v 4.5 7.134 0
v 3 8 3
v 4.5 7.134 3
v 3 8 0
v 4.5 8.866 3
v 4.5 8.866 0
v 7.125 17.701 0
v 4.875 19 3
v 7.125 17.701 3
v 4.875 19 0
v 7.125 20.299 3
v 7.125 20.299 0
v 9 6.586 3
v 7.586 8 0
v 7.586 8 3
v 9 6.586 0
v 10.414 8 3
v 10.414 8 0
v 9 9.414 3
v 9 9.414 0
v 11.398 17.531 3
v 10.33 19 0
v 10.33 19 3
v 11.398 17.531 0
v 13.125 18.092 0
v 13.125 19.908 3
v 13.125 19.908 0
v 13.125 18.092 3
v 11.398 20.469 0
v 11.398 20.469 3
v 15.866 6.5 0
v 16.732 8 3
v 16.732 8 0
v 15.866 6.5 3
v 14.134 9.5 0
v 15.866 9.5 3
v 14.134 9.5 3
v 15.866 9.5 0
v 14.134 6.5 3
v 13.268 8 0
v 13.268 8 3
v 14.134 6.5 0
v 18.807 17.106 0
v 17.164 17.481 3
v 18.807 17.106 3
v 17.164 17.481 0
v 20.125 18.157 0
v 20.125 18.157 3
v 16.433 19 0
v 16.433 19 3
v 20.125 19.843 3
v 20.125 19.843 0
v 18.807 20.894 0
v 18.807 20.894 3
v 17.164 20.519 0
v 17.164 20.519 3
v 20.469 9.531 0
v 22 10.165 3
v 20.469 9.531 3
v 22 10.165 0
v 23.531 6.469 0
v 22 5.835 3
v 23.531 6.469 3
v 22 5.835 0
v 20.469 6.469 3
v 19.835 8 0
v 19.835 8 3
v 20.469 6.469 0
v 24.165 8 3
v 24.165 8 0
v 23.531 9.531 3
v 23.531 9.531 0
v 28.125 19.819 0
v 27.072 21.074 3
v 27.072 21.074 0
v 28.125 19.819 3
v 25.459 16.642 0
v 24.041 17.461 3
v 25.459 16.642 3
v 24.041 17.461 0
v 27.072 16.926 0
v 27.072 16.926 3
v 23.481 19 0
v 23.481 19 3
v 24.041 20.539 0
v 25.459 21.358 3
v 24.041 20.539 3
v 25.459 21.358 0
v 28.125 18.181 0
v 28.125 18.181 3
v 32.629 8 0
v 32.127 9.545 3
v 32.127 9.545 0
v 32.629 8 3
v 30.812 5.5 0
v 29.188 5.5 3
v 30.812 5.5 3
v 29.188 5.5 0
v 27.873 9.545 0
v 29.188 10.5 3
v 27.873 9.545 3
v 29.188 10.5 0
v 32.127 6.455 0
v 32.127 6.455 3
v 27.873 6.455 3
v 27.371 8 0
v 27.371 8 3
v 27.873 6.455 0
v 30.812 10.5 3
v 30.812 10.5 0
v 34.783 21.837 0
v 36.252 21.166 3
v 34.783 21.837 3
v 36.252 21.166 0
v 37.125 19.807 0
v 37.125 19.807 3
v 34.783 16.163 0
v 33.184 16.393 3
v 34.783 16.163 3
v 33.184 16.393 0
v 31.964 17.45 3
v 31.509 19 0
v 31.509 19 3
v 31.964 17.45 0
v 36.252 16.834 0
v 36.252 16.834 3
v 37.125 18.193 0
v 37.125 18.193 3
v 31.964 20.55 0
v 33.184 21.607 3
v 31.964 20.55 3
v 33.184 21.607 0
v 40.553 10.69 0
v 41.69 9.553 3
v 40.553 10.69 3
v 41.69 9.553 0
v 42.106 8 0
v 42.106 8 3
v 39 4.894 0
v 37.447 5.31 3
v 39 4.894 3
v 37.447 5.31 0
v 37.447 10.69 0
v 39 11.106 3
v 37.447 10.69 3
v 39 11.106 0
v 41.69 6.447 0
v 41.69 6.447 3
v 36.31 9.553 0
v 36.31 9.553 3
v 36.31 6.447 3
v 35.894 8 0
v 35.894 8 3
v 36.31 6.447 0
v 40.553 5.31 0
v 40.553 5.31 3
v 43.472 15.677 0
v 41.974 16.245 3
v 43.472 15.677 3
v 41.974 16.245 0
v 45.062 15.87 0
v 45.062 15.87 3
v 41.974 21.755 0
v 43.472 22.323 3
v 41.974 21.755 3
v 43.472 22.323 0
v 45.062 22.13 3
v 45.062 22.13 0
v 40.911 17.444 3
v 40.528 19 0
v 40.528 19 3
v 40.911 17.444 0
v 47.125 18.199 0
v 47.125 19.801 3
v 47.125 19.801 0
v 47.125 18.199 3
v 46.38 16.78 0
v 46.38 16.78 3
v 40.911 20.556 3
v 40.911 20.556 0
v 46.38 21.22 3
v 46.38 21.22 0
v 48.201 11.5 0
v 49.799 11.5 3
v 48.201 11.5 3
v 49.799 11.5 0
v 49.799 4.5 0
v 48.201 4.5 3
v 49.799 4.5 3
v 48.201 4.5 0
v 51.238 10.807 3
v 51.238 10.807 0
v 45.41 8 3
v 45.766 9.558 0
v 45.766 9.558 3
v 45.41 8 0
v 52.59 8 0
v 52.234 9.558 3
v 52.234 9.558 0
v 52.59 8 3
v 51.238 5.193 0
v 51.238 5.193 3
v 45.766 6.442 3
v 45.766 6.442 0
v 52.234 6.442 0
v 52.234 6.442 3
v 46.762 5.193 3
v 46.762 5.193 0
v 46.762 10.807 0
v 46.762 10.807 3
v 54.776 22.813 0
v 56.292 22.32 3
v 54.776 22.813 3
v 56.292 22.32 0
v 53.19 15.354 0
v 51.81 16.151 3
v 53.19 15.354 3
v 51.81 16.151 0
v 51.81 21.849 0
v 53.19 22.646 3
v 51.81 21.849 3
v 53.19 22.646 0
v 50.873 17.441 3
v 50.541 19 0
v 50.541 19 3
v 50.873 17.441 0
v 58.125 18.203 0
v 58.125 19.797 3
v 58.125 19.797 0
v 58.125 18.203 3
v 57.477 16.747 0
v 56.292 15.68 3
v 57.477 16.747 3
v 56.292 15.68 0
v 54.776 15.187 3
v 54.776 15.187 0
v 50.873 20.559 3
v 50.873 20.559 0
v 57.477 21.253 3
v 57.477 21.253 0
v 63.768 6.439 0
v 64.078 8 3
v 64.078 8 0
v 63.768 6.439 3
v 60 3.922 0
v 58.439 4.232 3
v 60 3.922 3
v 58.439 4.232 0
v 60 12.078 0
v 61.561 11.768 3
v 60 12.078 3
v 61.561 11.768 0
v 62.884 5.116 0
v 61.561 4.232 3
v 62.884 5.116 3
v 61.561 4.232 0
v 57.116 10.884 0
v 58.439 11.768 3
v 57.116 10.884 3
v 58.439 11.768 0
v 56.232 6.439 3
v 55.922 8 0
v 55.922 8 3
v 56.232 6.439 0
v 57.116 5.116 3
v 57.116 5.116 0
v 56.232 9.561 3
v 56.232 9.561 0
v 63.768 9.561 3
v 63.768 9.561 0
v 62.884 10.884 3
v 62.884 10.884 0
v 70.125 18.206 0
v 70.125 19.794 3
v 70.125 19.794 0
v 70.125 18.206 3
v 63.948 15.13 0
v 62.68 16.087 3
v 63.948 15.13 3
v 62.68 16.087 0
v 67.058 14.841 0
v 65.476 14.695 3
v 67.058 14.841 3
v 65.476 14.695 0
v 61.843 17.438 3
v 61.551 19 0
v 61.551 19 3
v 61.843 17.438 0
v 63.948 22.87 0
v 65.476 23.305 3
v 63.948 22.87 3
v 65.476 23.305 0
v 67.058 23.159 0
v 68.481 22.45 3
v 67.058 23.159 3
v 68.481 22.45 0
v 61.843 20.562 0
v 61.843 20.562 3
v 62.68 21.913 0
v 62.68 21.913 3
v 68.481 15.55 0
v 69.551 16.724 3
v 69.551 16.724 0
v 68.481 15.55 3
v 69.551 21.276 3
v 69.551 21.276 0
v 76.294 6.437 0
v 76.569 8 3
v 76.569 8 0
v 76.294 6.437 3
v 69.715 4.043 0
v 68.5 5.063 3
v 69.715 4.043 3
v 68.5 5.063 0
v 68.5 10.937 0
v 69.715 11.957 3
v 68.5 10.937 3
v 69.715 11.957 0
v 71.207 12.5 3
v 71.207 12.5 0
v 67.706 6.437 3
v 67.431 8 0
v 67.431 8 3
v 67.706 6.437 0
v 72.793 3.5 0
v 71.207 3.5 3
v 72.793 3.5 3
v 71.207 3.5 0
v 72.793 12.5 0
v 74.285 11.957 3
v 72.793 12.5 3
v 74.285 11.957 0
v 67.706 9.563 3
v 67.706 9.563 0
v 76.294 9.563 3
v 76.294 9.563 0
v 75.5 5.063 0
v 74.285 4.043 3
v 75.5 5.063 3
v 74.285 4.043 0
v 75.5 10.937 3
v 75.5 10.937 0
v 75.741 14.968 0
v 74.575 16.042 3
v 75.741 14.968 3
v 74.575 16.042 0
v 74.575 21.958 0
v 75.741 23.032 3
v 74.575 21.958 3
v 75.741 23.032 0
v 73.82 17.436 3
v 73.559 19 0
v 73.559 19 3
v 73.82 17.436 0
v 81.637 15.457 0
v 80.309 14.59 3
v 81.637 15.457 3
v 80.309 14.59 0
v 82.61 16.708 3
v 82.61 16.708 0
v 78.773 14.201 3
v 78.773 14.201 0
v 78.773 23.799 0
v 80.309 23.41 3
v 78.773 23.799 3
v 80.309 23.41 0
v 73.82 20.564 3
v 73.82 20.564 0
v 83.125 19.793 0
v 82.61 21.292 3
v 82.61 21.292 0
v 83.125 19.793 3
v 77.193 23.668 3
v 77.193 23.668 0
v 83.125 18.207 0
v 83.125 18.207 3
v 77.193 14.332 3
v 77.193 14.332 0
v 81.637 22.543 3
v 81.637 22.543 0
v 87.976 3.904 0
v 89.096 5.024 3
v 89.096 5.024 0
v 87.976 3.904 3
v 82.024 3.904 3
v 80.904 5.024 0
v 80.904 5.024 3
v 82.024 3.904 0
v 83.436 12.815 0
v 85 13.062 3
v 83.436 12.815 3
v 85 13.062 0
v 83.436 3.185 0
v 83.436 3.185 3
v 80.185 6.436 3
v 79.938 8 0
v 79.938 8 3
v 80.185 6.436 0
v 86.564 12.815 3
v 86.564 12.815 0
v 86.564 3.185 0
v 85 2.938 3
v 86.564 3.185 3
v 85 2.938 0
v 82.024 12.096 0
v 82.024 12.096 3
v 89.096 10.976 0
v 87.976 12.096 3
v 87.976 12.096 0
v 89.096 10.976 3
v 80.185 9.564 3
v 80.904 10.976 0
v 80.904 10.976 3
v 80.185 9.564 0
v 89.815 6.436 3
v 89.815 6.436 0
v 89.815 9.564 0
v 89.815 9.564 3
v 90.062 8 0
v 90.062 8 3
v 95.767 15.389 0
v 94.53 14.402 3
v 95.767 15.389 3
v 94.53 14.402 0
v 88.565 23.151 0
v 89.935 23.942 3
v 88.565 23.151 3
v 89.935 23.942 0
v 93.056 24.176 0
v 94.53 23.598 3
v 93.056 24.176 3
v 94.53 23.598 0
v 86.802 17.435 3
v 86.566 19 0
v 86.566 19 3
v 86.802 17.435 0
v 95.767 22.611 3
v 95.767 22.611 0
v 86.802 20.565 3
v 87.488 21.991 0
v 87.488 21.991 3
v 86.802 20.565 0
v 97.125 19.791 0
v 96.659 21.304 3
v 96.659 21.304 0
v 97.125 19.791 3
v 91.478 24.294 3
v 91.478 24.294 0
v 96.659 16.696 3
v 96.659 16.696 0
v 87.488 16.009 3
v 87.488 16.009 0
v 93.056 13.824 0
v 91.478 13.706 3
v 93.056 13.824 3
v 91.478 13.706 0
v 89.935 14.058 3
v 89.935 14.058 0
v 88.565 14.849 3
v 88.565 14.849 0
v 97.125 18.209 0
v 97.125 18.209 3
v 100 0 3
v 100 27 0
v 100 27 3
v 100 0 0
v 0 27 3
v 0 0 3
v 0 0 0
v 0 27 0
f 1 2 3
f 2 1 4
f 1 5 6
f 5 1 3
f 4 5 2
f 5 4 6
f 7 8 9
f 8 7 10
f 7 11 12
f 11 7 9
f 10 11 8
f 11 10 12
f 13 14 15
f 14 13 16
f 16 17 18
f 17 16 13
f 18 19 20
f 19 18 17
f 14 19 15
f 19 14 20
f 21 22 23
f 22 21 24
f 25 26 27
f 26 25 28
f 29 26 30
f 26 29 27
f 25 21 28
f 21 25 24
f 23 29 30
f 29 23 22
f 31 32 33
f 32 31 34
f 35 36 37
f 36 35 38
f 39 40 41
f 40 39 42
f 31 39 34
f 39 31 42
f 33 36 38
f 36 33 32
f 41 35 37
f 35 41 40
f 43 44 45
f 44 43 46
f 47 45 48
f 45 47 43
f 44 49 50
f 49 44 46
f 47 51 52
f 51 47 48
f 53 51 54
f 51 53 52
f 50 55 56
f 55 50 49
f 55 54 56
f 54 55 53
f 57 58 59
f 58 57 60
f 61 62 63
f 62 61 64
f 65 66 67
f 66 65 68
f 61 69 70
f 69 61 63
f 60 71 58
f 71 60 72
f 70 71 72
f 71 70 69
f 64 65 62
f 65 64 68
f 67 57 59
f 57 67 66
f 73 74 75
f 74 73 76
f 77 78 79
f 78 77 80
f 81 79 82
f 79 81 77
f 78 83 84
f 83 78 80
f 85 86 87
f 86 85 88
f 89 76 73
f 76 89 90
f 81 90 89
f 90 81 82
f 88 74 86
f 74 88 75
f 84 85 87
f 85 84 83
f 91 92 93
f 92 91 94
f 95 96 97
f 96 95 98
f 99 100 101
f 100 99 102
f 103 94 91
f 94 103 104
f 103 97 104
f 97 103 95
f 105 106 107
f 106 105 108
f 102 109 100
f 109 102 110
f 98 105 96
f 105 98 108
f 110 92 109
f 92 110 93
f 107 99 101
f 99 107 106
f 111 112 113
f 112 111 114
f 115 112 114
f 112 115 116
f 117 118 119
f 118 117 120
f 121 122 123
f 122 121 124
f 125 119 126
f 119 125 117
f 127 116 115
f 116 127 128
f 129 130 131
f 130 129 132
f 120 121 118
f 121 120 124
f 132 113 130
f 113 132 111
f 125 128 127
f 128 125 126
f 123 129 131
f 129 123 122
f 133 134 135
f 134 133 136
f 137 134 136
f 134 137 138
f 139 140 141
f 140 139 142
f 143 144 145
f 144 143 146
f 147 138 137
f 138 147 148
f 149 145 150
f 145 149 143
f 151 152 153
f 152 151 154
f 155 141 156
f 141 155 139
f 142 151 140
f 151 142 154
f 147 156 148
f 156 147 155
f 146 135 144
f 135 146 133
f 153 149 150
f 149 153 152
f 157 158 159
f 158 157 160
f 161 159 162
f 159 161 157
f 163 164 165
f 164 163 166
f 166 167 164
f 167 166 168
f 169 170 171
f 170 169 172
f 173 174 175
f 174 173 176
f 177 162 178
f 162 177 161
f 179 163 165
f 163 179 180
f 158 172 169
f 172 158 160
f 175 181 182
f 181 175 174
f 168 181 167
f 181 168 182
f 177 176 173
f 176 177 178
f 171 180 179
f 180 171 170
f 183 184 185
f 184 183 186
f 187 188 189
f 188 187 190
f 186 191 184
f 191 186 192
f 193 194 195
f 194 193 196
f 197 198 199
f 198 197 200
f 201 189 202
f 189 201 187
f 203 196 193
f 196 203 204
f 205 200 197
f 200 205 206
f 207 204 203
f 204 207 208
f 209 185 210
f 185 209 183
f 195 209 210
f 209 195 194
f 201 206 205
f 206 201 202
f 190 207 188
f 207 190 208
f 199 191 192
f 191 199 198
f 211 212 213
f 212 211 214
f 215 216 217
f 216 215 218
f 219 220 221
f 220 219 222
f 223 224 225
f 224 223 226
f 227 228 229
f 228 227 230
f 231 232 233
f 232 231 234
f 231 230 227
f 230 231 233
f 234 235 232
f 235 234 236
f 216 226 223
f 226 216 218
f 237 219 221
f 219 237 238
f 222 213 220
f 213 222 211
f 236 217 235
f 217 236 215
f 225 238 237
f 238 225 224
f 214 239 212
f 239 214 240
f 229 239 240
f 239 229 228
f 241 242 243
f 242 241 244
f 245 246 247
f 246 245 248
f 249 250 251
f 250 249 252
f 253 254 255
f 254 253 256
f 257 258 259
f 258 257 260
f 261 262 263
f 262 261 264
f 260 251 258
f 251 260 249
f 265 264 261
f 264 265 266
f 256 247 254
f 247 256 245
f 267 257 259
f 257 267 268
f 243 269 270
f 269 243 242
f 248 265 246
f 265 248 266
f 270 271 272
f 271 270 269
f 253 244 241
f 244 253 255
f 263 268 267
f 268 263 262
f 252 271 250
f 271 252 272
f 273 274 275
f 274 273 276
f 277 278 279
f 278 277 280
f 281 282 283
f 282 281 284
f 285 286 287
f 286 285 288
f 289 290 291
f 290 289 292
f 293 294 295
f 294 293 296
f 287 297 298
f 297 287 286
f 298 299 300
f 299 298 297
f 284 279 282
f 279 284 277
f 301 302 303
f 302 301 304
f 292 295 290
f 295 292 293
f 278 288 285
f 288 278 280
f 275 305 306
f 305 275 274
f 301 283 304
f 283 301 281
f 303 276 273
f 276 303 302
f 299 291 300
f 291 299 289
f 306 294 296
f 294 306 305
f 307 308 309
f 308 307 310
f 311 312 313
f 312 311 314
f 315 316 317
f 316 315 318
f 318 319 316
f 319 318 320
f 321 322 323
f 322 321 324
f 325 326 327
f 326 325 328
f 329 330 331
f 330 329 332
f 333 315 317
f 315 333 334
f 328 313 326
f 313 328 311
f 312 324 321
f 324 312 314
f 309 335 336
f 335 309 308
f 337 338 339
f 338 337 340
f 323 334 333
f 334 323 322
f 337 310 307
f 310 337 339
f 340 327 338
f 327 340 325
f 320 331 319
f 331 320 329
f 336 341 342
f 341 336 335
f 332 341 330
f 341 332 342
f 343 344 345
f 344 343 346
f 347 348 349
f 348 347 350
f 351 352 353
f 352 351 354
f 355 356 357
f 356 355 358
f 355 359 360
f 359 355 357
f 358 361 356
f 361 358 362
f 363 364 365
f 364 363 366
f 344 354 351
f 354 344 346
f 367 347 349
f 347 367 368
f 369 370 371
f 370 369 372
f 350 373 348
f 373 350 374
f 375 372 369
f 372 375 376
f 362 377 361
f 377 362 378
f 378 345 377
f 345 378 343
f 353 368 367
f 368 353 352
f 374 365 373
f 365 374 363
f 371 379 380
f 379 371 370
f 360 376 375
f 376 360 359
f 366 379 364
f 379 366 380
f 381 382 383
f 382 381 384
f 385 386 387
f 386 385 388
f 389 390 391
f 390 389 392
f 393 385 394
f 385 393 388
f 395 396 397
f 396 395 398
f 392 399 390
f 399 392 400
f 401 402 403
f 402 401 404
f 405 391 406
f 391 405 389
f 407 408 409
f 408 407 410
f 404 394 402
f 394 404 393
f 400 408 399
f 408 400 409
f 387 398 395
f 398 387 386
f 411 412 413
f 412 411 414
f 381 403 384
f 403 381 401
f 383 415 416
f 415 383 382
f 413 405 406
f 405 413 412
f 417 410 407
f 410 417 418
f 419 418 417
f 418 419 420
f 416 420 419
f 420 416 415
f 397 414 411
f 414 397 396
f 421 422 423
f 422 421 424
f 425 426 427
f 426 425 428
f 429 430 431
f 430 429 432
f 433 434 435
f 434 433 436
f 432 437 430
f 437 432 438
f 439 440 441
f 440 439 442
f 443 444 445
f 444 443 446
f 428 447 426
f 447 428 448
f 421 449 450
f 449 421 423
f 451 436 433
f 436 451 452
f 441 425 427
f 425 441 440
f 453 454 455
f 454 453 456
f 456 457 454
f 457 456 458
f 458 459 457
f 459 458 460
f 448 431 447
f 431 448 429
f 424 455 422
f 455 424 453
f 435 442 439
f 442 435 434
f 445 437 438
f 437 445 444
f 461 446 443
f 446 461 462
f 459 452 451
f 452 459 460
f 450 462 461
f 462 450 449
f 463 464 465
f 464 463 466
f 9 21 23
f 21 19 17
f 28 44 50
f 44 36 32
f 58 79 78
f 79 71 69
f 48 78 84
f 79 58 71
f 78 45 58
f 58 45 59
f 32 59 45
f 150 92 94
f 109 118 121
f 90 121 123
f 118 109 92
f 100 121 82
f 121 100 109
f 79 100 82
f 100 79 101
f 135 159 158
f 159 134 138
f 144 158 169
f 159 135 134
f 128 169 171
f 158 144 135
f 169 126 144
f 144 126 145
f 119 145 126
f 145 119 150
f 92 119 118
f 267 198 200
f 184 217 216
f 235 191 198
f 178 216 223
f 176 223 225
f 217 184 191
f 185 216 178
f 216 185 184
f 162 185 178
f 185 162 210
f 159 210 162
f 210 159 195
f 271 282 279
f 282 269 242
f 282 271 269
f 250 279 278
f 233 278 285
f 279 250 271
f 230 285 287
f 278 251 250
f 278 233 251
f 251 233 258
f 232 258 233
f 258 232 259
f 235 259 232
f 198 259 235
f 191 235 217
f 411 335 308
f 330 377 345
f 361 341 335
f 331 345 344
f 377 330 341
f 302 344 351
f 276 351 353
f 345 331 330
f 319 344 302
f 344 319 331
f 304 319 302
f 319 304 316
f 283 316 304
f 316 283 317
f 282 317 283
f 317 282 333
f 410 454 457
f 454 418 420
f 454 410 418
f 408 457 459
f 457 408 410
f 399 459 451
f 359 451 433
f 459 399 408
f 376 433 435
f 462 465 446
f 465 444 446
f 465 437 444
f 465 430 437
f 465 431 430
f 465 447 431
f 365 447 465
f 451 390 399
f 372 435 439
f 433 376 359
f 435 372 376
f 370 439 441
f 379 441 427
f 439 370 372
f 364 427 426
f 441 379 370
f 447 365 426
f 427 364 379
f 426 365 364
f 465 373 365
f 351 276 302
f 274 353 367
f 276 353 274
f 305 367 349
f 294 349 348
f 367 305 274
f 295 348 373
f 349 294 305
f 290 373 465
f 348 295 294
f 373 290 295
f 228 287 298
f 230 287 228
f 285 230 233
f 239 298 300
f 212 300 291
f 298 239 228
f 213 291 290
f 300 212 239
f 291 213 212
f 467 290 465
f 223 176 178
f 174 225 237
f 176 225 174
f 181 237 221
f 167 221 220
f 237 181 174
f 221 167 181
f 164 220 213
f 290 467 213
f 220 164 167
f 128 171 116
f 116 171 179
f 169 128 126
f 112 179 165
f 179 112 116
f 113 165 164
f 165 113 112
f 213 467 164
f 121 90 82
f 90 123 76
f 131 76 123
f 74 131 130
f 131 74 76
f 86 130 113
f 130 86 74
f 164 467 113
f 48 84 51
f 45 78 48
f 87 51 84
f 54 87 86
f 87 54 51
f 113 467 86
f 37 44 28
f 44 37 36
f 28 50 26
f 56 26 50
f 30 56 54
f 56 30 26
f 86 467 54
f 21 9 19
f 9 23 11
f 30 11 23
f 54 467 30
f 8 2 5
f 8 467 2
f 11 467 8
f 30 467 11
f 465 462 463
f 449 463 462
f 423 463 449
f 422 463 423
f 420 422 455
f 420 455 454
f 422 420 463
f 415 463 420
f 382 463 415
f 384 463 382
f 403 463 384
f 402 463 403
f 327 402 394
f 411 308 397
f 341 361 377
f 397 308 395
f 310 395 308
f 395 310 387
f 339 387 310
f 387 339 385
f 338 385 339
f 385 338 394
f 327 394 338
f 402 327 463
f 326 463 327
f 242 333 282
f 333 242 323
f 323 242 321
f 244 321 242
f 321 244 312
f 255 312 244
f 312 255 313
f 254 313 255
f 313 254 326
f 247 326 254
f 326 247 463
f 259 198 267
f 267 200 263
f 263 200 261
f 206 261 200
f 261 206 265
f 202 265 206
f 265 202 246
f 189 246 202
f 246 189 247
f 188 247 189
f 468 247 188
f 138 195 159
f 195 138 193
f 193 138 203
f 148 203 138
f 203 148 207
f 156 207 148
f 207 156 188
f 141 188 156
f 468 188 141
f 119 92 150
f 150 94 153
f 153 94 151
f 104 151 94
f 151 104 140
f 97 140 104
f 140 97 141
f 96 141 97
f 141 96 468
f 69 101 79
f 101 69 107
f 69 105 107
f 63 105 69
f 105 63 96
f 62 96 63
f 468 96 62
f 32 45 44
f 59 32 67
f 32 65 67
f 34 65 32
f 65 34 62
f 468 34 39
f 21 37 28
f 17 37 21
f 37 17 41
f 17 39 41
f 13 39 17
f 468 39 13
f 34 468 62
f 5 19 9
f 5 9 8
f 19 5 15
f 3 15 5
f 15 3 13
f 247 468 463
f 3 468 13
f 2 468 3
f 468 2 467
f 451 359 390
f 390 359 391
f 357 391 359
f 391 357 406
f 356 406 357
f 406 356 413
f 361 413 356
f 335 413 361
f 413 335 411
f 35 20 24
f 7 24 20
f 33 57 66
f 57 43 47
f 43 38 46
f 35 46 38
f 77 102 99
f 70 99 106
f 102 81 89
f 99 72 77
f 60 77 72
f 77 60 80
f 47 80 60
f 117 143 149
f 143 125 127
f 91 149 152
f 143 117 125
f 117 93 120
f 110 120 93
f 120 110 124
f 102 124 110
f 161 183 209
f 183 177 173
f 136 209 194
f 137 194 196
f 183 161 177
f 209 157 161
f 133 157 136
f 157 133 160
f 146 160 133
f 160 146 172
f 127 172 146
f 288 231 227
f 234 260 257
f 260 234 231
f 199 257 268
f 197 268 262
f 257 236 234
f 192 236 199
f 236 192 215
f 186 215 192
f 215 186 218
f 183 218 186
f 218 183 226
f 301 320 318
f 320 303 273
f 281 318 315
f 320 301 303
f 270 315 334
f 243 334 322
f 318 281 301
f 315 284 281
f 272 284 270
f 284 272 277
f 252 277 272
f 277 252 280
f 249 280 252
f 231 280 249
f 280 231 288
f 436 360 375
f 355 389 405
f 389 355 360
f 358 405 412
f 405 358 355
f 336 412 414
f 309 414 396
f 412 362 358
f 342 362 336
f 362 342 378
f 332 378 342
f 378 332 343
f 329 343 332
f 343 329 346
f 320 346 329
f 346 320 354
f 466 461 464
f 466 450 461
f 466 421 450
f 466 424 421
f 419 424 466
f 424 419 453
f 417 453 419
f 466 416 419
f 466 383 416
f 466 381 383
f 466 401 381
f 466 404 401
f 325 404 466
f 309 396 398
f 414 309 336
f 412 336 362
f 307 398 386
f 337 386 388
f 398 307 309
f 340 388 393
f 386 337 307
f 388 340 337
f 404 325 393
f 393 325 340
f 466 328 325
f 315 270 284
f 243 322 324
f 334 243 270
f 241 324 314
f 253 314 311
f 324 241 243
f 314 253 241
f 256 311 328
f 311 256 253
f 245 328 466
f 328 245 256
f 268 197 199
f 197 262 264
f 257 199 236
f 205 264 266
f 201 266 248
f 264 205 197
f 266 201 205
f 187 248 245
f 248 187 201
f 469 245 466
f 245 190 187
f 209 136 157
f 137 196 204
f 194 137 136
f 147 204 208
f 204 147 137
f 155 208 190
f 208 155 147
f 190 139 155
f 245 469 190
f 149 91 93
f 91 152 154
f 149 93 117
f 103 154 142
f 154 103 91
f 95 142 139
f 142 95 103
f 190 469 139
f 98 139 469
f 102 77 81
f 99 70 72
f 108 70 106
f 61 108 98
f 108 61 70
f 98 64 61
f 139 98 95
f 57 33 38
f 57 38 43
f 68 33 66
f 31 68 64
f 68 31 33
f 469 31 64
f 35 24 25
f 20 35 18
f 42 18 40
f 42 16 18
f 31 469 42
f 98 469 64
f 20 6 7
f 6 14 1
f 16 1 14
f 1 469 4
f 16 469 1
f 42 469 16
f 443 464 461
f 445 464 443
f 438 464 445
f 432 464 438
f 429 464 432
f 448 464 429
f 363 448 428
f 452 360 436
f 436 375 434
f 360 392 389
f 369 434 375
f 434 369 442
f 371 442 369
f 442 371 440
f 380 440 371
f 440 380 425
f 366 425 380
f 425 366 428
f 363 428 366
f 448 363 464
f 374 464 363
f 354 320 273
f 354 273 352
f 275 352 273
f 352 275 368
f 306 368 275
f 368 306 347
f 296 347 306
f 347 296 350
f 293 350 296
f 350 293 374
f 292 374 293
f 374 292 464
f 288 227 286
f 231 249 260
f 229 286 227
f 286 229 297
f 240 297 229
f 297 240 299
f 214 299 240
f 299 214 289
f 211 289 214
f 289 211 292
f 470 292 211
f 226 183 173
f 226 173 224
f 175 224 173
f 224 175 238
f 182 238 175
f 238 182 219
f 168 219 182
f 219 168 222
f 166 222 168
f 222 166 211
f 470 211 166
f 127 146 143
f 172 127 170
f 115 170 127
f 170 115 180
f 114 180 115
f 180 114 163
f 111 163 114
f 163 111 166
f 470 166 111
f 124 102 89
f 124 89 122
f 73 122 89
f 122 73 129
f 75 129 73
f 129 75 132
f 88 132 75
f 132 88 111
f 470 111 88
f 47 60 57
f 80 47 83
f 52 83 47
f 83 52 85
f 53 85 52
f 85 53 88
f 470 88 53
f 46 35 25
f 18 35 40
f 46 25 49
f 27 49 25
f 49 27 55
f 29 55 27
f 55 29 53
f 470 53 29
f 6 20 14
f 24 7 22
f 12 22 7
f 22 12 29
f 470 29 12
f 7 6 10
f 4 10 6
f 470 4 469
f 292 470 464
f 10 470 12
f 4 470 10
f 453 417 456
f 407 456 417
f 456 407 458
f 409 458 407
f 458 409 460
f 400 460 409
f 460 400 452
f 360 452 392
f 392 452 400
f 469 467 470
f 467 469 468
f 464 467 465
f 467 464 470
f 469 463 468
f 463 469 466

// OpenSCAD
// Copyright 2011 Nophead (of RepRap fame)
// This file is licensed under the terms of Creative Commons Attribution 3.0 Unported.

// Using this holes should come out approximately right when printed
module polyhole(h, d) {
    n = max(round(2 * d),3);
    rotate([0,0,180])
        cylinder(h = h, r = (d / 2) / cos (180 / n), $fn = n);
}

module test_polyhole(){
difference() {
	cube(size = [100,27,3]);
    union() {
    	for(i = [1:10]) 
        {
            translate([(i * i + i)/2 + 3 * i , 8,-1])
                polyhole(h = 5, d = i);
                
            d = i + 0.5;
                translate([(d * d + d)/2 + 3 * d, 19,-1])
                    polyhole(h = 5, d = d);
    	}
    }
}
}

test_polyhole();
